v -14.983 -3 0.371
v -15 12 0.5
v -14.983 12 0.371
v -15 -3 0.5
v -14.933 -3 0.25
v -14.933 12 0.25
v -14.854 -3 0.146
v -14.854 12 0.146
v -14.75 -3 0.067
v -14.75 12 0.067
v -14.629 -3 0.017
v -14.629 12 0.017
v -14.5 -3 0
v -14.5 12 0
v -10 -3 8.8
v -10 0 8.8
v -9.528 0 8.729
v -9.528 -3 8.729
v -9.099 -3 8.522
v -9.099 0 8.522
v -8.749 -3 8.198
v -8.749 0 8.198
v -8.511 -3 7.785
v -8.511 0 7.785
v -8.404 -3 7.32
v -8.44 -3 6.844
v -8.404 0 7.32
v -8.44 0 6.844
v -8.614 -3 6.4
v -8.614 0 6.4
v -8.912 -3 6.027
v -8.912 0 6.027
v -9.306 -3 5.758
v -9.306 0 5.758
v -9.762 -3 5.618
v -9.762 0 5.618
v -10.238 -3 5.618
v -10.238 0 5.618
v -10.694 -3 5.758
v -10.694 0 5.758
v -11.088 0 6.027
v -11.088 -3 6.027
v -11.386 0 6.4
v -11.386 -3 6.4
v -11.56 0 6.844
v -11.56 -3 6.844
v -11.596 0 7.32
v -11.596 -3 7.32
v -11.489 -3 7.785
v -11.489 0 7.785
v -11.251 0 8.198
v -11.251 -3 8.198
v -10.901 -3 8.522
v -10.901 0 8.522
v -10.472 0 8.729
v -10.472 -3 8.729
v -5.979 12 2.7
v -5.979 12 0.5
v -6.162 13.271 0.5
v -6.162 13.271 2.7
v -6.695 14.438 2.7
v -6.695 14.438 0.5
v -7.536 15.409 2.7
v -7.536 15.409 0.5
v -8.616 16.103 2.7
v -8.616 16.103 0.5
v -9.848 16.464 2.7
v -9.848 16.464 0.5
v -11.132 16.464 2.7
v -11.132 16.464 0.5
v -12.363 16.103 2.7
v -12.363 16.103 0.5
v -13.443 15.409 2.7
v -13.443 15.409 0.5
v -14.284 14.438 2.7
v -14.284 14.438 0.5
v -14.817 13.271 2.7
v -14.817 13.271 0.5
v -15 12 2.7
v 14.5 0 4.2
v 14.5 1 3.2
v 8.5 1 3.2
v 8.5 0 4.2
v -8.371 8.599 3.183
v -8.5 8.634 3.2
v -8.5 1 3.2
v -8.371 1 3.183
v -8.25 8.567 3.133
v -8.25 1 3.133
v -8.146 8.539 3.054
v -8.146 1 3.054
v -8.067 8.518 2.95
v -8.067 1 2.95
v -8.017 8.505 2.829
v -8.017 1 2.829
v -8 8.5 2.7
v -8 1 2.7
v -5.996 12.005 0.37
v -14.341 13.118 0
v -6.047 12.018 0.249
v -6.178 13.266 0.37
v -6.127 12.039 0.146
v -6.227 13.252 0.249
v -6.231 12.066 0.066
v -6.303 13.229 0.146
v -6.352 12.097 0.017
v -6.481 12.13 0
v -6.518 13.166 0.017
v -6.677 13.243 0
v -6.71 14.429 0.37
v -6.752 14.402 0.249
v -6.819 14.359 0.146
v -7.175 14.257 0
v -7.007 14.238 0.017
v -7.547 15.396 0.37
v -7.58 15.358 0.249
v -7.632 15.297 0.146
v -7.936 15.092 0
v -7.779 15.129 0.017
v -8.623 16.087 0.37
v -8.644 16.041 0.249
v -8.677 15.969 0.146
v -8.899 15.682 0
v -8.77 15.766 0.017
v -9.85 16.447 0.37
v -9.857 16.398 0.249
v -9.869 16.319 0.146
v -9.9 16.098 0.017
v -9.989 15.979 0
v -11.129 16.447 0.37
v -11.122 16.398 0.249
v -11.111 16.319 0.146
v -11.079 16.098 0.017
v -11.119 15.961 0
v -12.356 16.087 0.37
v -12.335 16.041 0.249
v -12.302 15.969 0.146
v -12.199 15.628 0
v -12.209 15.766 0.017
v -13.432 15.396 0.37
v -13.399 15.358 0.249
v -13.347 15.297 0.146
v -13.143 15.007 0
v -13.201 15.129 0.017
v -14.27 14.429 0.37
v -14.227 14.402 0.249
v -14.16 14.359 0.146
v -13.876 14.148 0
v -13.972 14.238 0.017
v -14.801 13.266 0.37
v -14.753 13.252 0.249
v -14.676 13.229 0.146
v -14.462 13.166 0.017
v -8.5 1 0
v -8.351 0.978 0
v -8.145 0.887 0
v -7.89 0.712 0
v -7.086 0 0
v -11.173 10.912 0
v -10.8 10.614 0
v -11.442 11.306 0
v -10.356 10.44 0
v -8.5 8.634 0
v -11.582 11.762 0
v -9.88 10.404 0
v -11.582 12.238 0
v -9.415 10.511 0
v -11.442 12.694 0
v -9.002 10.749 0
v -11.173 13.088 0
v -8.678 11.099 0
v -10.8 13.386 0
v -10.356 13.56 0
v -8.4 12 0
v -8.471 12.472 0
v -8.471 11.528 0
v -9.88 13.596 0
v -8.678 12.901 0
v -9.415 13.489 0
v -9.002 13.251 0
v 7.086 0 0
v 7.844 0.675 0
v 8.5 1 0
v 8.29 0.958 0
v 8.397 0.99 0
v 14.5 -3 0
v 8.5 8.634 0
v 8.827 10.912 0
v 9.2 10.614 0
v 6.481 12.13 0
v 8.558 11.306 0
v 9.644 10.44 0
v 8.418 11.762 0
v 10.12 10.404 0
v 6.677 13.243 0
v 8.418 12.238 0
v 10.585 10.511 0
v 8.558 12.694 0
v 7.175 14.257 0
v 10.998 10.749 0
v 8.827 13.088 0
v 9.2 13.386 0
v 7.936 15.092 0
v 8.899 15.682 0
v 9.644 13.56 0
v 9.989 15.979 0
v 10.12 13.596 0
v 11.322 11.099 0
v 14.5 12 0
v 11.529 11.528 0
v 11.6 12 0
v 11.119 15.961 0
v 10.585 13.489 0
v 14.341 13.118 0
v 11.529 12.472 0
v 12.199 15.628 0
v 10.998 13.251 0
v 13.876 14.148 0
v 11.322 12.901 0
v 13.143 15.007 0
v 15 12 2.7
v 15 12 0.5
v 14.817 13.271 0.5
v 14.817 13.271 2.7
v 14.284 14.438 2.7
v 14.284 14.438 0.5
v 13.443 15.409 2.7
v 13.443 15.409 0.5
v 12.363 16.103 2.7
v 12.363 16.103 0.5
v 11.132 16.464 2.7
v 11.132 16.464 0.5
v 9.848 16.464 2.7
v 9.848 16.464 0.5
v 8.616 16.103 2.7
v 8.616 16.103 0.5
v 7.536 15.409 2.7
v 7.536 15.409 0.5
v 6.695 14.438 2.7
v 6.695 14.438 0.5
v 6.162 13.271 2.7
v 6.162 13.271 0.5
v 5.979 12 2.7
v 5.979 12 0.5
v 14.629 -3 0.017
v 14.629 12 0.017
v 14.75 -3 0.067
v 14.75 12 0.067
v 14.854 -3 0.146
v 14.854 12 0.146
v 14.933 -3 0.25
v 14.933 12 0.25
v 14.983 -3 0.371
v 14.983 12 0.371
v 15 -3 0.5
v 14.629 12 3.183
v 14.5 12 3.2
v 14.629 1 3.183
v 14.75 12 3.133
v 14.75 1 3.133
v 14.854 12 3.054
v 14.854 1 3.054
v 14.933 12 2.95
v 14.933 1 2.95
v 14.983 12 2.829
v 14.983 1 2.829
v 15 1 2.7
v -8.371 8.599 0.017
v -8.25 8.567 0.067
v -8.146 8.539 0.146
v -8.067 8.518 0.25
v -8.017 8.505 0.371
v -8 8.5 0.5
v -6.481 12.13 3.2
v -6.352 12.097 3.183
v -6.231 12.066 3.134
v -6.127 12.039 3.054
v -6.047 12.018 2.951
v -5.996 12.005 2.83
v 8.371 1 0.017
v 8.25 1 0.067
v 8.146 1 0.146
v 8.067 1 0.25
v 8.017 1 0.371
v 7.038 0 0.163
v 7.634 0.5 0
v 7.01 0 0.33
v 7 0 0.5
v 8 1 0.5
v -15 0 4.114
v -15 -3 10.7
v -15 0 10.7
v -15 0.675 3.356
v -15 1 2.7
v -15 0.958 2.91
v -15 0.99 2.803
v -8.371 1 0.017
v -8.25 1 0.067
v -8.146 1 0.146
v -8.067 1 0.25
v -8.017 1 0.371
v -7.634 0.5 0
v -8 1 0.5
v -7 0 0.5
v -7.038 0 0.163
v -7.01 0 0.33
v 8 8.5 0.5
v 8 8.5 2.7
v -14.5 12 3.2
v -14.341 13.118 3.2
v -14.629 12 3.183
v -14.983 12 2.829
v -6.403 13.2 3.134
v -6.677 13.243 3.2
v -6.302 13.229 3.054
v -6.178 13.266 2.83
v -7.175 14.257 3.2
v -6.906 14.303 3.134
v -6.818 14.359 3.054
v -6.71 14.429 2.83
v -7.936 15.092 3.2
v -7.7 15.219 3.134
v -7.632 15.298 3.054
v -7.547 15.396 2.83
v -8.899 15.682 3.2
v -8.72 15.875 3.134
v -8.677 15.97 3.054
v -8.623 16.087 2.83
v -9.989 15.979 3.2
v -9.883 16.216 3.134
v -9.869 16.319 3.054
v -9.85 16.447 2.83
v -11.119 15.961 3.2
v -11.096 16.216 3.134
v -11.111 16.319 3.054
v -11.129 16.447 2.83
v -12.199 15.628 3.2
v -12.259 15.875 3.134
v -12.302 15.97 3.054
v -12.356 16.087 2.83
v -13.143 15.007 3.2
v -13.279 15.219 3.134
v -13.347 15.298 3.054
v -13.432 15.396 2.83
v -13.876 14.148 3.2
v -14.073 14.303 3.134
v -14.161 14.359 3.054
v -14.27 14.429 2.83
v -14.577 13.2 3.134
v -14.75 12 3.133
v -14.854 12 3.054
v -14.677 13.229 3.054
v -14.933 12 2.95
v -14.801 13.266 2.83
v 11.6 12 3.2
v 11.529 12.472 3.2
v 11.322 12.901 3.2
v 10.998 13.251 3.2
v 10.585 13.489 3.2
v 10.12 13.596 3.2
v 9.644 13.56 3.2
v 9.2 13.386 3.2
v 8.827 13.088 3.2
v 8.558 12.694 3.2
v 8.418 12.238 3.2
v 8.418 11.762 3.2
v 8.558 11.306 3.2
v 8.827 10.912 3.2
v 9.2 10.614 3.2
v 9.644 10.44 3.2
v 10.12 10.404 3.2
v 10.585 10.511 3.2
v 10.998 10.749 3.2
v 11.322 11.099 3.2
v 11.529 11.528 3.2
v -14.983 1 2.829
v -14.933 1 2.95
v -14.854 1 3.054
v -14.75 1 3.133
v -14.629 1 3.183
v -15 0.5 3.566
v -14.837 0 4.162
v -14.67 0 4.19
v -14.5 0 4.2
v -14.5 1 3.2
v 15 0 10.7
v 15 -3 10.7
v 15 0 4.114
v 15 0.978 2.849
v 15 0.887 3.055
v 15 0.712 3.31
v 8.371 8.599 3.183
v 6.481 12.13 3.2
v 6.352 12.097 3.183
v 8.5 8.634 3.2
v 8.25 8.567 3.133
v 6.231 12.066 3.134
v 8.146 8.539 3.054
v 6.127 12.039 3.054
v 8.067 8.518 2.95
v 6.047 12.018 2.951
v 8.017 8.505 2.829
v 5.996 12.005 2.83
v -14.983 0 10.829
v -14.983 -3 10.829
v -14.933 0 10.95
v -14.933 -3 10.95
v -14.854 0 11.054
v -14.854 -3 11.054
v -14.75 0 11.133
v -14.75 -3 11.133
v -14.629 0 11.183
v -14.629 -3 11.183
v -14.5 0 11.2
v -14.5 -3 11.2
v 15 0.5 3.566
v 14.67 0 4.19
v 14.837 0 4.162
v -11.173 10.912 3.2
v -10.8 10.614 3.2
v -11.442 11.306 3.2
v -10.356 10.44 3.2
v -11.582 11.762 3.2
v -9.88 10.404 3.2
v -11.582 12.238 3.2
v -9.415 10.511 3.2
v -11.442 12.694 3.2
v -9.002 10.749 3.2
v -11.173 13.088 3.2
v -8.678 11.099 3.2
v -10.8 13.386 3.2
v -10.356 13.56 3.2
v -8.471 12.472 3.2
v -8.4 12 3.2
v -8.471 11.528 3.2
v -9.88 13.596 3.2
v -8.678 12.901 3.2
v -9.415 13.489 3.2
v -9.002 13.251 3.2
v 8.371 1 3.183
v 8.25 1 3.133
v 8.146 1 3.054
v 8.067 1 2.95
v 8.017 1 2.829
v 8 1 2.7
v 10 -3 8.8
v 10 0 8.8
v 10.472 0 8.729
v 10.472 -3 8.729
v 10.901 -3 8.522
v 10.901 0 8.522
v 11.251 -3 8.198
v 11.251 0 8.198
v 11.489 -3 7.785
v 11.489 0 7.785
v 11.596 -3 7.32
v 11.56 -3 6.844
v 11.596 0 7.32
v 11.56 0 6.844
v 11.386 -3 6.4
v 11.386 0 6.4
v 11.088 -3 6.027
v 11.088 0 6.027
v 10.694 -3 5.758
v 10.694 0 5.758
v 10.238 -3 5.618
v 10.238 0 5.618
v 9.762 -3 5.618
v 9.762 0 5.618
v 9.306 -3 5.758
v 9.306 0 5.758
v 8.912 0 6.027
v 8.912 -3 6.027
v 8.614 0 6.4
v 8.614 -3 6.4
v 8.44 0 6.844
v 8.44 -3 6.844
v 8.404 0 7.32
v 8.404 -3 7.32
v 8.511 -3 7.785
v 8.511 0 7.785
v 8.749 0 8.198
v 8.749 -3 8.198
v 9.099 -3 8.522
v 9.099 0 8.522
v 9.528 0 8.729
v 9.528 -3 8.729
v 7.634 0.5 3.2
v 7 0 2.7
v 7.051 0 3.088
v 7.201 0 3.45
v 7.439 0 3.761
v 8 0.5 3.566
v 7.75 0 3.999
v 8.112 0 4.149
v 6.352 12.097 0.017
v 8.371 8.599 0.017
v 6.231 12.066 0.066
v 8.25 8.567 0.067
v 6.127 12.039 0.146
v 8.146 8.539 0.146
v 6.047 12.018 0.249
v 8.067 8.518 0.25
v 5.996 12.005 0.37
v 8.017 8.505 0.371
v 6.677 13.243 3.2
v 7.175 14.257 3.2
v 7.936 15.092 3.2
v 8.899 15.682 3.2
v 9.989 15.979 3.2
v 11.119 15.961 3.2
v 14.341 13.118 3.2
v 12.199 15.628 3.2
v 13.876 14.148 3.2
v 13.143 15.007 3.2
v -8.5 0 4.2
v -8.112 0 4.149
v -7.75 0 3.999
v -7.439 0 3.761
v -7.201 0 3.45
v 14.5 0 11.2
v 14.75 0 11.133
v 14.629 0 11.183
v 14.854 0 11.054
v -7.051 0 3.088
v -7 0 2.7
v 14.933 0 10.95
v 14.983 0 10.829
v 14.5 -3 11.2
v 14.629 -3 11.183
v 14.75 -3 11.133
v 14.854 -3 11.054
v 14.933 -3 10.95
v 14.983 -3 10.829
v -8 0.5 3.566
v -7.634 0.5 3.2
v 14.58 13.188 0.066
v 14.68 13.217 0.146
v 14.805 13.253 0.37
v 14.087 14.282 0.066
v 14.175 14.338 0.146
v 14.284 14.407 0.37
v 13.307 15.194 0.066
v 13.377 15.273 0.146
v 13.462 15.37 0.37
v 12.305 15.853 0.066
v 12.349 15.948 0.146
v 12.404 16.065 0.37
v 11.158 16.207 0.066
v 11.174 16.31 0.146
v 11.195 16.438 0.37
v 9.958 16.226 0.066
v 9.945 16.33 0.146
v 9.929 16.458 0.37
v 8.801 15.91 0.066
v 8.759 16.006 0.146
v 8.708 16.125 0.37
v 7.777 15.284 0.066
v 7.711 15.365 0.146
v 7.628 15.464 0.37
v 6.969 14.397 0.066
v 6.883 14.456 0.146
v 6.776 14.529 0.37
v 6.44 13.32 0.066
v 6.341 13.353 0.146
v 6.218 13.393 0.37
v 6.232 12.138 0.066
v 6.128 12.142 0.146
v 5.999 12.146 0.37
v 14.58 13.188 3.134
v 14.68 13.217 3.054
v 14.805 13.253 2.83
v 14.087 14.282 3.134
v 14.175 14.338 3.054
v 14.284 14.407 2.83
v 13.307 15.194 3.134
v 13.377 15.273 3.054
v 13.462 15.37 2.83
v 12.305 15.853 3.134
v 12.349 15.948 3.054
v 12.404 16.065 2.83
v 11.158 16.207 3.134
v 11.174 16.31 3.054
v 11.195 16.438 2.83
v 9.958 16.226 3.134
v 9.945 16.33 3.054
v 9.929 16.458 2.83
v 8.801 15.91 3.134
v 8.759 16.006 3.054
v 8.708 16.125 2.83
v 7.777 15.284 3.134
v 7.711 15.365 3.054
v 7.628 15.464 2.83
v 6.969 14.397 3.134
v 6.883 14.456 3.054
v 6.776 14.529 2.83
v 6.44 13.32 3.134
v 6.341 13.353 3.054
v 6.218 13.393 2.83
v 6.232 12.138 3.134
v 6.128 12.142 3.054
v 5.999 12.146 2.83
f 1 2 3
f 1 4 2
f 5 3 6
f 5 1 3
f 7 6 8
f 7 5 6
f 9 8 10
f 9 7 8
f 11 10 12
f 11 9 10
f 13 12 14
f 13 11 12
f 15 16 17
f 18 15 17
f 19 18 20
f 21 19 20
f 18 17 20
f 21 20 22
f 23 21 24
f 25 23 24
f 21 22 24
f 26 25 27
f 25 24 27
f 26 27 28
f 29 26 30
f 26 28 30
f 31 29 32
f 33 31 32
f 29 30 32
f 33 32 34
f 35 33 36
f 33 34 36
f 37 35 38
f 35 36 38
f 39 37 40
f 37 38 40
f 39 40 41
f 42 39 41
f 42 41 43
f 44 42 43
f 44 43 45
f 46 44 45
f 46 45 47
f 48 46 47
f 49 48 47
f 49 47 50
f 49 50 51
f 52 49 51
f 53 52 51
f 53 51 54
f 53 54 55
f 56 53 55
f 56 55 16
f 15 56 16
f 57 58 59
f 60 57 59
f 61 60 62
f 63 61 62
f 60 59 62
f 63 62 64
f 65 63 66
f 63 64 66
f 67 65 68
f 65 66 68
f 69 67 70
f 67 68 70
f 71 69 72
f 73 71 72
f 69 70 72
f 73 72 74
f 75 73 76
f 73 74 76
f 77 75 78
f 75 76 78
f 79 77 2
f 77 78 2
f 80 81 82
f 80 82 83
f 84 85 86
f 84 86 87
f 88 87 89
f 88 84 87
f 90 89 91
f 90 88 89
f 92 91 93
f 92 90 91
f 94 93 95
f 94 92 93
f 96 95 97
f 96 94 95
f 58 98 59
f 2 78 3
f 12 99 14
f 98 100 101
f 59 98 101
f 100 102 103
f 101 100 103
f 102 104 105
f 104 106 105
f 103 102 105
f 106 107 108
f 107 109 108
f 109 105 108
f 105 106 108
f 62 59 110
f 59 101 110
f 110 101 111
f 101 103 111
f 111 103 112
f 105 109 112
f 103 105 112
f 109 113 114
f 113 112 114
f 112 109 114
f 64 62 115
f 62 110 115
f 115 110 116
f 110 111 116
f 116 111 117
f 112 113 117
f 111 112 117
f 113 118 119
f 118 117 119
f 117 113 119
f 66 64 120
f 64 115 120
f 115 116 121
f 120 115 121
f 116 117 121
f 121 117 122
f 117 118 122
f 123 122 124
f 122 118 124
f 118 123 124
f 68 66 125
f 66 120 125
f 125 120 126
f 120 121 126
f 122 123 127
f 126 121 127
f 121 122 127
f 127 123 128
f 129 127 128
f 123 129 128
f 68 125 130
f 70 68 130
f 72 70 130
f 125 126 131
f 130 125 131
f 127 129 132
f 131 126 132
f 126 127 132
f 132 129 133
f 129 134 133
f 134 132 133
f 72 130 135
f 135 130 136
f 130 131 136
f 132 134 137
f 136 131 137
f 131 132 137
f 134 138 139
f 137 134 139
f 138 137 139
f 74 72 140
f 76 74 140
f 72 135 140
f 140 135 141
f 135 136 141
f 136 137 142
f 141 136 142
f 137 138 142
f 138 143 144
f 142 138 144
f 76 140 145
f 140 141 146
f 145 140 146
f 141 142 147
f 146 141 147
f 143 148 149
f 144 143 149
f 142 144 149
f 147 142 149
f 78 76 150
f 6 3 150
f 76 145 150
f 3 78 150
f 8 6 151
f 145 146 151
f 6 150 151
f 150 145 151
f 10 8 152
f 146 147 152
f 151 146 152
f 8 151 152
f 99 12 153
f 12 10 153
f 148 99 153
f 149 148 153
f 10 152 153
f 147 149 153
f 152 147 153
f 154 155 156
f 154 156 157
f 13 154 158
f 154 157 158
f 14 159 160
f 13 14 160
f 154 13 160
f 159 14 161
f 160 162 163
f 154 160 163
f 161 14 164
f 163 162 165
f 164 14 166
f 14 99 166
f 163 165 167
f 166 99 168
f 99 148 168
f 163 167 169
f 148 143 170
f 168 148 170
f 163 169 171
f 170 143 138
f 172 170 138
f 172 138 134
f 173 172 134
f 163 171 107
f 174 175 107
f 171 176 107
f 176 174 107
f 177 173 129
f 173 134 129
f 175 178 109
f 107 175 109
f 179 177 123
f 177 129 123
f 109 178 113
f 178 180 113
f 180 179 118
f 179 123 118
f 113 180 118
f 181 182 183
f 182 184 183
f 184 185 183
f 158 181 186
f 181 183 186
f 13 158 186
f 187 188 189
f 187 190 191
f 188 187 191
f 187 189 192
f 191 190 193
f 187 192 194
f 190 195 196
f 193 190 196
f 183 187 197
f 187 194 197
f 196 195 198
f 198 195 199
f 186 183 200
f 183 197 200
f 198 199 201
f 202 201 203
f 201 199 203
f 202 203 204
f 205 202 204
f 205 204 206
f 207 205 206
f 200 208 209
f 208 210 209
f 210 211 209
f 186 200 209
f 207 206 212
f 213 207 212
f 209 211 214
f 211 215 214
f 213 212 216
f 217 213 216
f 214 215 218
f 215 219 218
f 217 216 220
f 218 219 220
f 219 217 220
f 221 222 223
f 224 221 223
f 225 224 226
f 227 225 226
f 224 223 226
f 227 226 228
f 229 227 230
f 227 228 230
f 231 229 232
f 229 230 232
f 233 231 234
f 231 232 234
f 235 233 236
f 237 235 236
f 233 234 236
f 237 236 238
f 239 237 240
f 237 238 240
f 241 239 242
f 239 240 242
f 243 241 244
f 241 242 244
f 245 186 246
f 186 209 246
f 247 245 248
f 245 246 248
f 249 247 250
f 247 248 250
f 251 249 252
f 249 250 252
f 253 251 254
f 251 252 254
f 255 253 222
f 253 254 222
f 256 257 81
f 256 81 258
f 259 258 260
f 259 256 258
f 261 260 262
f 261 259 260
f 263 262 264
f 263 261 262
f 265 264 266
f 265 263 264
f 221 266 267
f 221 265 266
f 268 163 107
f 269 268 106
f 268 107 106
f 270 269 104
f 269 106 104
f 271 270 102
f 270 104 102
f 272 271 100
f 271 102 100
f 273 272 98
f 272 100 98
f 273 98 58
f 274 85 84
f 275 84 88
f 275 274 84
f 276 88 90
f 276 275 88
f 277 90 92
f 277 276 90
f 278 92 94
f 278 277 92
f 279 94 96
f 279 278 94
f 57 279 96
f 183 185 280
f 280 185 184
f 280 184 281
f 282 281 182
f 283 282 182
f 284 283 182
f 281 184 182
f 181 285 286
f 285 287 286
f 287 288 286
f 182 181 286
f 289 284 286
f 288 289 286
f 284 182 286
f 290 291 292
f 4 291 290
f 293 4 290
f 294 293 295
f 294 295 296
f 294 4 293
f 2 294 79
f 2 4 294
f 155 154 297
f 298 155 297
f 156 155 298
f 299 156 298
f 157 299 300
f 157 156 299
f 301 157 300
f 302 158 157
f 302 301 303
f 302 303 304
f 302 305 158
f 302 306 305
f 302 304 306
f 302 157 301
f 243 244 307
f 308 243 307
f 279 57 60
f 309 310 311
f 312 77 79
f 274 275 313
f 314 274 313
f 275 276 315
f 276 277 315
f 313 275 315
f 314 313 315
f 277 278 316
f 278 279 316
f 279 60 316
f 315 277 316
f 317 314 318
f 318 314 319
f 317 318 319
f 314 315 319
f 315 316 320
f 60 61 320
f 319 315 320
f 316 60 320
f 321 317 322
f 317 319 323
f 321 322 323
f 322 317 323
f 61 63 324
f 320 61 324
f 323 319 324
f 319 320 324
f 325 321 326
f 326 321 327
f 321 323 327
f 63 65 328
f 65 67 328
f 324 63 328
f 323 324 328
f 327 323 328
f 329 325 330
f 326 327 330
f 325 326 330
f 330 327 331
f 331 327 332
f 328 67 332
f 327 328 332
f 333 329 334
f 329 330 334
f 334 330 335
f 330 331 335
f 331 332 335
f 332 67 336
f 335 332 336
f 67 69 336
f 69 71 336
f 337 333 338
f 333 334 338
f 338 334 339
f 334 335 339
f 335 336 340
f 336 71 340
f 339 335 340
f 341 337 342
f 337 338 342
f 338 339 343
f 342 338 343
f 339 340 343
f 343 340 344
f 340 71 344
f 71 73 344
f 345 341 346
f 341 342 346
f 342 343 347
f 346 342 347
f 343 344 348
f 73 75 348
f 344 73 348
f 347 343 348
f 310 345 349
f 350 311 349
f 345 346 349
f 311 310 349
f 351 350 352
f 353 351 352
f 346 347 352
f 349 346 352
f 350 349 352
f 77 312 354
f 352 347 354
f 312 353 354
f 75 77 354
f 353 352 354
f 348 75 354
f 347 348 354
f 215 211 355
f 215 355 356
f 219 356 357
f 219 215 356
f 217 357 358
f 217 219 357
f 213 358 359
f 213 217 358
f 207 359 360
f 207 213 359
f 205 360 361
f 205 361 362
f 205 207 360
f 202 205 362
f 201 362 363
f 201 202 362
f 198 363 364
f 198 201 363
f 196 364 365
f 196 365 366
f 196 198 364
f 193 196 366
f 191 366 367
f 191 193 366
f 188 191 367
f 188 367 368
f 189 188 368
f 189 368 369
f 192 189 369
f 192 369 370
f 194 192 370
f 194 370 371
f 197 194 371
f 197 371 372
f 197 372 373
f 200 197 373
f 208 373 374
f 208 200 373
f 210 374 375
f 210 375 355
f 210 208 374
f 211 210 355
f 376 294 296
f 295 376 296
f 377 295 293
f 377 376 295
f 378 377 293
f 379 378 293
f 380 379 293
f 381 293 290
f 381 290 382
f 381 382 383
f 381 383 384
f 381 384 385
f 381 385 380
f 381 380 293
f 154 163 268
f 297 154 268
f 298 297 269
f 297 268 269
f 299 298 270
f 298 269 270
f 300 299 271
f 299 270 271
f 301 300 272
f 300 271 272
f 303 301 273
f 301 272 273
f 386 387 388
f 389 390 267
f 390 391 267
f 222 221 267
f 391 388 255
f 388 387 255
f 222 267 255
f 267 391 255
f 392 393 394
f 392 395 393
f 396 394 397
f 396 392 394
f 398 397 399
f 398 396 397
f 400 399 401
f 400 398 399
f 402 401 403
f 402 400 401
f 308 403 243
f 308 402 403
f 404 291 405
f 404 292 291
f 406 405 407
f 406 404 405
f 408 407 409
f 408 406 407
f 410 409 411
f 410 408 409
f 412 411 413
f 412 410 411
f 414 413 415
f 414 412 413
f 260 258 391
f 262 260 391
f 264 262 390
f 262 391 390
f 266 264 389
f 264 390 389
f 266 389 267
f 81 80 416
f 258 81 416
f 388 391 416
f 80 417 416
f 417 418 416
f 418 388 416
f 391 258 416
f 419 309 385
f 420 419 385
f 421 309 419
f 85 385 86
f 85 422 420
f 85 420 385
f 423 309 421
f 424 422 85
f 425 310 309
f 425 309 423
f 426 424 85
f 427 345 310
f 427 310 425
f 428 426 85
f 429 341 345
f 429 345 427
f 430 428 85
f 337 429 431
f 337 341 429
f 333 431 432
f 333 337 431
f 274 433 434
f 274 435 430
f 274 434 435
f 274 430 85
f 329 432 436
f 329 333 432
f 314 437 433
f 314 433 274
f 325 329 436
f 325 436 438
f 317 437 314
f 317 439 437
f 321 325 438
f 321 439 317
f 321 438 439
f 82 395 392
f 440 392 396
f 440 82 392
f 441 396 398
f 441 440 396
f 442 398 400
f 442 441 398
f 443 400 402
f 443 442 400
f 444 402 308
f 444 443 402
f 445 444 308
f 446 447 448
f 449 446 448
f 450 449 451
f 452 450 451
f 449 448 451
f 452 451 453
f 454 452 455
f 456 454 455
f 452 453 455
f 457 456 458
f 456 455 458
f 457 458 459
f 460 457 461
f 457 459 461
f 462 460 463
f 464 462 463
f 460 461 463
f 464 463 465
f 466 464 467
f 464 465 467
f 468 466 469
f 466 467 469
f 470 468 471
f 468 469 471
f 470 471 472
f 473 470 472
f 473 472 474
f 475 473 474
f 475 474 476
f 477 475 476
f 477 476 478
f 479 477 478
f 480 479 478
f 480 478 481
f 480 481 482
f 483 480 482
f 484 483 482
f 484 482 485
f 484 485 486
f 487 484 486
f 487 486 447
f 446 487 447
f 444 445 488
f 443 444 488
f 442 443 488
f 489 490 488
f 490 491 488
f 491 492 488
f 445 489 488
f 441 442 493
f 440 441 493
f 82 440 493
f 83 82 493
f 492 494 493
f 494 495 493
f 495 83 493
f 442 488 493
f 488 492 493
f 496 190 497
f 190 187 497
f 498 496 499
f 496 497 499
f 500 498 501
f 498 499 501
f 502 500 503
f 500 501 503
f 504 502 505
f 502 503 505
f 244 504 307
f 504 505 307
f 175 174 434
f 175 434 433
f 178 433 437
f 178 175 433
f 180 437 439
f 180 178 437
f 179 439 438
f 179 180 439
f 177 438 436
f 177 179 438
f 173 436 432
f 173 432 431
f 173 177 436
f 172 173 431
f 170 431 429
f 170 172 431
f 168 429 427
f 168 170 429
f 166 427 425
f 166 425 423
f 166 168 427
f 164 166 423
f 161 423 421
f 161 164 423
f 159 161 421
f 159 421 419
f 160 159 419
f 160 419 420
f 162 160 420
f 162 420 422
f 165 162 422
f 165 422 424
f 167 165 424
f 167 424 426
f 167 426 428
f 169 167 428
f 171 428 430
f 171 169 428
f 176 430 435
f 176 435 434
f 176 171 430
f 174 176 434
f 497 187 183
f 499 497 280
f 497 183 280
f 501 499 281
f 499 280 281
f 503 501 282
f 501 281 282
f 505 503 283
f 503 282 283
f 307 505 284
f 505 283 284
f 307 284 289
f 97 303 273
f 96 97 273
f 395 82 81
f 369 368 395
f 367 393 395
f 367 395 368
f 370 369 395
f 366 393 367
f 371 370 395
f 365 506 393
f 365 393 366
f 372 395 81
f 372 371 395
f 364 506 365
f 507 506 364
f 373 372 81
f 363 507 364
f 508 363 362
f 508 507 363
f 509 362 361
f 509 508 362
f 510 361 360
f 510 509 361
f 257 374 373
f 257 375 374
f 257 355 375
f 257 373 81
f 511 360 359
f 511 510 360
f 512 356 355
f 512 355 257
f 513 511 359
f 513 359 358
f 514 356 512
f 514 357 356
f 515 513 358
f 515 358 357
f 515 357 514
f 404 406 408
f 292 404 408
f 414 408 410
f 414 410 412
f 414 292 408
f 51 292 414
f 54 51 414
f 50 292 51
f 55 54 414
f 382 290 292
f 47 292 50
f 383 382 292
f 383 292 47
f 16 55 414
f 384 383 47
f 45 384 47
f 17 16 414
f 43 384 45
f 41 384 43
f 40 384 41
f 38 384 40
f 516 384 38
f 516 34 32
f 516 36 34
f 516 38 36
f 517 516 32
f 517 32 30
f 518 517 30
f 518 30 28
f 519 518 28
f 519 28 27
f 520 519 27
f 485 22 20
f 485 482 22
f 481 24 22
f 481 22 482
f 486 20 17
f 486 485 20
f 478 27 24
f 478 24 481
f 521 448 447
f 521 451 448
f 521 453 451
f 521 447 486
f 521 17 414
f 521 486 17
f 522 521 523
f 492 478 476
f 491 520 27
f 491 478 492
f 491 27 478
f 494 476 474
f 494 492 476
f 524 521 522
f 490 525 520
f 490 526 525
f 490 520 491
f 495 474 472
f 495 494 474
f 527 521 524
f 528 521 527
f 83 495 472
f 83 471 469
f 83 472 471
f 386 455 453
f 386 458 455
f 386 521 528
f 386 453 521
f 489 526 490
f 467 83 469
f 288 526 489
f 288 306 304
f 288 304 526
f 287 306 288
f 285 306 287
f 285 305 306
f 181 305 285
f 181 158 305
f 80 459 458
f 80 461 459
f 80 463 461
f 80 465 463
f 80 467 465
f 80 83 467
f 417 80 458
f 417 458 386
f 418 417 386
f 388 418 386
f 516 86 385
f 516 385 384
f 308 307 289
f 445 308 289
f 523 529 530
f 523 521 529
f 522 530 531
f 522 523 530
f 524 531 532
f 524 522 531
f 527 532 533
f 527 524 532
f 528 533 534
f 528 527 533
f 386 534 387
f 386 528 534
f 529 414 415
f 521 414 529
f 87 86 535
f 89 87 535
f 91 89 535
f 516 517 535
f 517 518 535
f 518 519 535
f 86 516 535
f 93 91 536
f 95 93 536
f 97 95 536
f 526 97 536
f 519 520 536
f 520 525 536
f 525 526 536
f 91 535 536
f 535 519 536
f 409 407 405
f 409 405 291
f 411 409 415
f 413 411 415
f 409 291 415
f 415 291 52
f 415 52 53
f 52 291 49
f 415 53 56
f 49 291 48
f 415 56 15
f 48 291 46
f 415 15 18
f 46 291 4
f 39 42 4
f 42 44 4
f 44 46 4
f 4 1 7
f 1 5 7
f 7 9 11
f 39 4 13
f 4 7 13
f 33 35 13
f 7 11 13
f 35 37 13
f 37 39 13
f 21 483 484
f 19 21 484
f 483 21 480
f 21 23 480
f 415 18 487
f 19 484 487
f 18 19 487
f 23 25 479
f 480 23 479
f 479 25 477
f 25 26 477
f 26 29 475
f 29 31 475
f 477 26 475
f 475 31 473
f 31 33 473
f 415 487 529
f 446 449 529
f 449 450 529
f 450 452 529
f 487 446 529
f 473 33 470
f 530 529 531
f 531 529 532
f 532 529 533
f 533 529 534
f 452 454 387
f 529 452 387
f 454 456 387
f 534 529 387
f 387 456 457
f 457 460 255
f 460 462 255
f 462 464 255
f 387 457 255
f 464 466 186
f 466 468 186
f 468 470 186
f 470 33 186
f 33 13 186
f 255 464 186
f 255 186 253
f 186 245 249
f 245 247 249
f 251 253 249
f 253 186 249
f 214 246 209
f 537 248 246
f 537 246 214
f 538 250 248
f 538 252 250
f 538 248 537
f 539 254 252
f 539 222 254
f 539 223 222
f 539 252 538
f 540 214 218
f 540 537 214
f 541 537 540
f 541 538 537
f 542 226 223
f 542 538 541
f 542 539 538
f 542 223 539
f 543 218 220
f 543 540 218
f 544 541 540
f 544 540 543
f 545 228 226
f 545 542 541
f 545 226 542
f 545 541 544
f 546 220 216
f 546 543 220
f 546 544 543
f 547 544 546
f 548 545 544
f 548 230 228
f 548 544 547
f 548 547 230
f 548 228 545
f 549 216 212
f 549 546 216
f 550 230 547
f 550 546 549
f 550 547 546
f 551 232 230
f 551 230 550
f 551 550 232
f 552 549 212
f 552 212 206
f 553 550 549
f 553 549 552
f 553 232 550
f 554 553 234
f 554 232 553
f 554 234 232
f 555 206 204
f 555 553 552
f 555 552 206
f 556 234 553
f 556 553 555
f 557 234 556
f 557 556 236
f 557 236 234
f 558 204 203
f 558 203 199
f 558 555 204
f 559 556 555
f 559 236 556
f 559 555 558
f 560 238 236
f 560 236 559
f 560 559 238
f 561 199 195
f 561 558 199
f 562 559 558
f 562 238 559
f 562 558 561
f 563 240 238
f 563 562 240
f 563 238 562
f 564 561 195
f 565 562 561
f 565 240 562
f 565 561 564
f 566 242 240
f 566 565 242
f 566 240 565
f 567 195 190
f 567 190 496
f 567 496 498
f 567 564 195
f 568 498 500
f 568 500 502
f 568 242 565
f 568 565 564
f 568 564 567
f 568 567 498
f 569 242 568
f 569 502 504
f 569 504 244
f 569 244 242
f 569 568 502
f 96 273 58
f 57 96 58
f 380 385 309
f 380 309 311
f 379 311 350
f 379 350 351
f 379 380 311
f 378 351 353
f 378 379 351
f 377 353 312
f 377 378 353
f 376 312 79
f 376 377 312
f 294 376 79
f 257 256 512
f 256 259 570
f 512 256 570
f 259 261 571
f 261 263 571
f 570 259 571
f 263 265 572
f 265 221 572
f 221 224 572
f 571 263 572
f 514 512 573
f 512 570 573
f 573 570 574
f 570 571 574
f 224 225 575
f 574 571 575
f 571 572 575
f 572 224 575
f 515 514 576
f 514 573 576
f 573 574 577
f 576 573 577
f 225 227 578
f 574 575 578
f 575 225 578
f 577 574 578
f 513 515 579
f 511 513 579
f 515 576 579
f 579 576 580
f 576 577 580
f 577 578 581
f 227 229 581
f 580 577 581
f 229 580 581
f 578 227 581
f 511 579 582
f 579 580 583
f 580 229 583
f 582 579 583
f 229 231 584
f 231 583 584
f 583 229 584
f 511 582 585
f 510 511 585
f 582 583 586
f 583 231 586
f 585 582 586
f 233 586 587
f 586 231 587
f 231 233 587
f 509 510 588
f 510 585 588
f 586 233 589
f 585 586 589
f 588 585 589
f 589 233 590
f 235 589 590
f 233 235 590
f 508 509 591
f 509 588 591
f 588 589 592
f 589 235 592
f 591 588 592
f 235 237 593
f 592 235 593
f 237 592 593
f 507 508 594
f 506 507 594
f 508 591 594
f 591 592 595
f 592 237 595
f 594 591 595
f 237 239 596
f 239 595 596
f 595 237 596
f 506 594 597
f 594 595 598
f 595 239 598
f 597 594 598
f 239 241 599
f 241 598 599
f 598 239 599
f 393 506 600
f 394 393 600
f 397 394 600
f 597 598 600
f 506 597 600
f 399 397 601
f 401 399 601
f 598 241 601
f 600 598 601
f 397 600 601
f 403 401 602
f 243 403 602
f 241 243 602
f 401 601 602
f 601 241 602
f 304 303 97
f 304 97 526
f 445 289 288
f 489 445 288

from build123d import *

# Parameters (mm, degrees)
SKETCH1_R           = 1.6
BOSS_EXTRUDE1_DEPTH = 3.2
SKETCH2_W           = 30
SKETCH2_H           = 3
BOSS_EXTRUDE2_DEPTH = 8
SKETCH3_R           = 1.6
CUT_EXTRUDE1_DEPTH  = 25.960610678
FILLET1_R           = 0.5
CHAMFER1_SIZE       = 1


with BuildPart() as part:
    # Sketch1 → Boss-Extrude1 (new body)
    with BuildSketch(Plane.XY):
        with BuildLine():
            Line((-15, -3), (15, -3))
            Line((15, -3), (15, 12))
            ThreePointArc((15, 12), (10.489637029, 16.510362971), (5.979274058, 12))
            Line((5.979274058, 12), (8, 8.5))
            Line((8, 8.5), (8, 0))
            Line((8, 0), (-8, 0))
            Line((-8, 0), (-8, 8.5))
            Line((-8, 8.5), (-5.979274058, 12))
            ThreePointArc((-5.979274058, 12), (-10.489637029, 16.510362971), (-15, 12))
            Line((-15, 12), (-15, -3))
        make_face()
        with Locations((-10, 12)):
            Circle(SKETCH1_R, mode=Mode.SUBTRACT)
        with Locations((10, 12)):
            Circle(SKETCH1_R, mode=Mode.SUBTRACT)
    extrude(amount=BOSS_EXTRUDE1_DEPTH)

    # Sketch2 → Boss-Extrude2 (add)
    with BuildSketch(Plane.XY.offset(3.2)):
        with Locations((0, -1.5)):
            Rectangle(SKETCH2_W, SKETCH2_H)
    extrude(amount=BOSS_EXTRUDE2_DEPTH)

    # Sketch3 → Cut-Extrude1 (cut, through all)
    with BuildSketch(Plane(origin=(0, 0, 0), x_dir=(1, 0, 0), z_dir=(0, 1, 0))):
        with Locations(Location((-10, -7.2, 0), (0, 0, 270))):
            Circle(SKETCH3_R)
        with Locations(Location((10, -7.2, 0), (0, 0, 270))):
            Circle(SKETCH3_R)
    extrude(amount=-CUT_EXTRUDE1_DEPTH, mode=Mode.SUBTRACT)

    # Fillet1
    fillet1_edges = [part.edges().sort_by_distance(p)[0] for p in [
        (8, 4.25, 0),
        (6.989637029, 10.25, 0),
        (10.489637029, 16.510362971, 0),
        (15, 4.5, 0),
        (-15, 4.5, 0),
        (-10.489637029, 16.510362971, 0),
        (10.489637029, 16.510362971, 3.2),
        (6.989637029, 10.25, 3.2),
        (8, 4.25, 3.2),
        (-8, 4.25, 3.2),
        (-6.989637029, 10.25, 3.2),
        (15, 6, 3.2),
        (-10.489637029, 16.510362971, 3.2),
        (-15, -1.5, 11.2),
        (15, -1.5, 11.2),
        (-15, 6, 3.2),
        (-6.989637029, 10.25, 0),
        (-8, 4.25, 0),
    ]]
    fillet(fillet1_edges, radius=FILLET1_R)

    # Chamfer1
    # the kernel refuses this chamfer: 1 mm, written as the material it adds along each edge
    with BuildSketch(Plane(origin=(-8.5, 0, 3.2), x_dir=(0, 0.9996219169112968, -0.027495876610586494), z_dir=(-1, 0, 0)), Plane(origin=(14.5, 0, 3.2), x_dir=(0, 0.9996219169112968, -0.027495876610586494), z_dir=(-1, 0, 0))) as chamfer1_piece_1:
        Polygon((CHAMFER1_SIZE * 0.999621916911, -CHAMFER1_SIZE * 0.0274958766106), (-CHAMFER1_SIZE * 0.0274958766106, -CHAMFER1_SIZE * 0.999621916911), (0, 0), align=None)
    extrude(amount=6)
    with BuildSketch(Plane(origin=(-8, 0, 0.5), x_dir=(-0.02749587661058563, 0.9996219169112968, 0), z_dir=(0, 0, 1))) as chamfer1_piece_2:
        Polygon((CHAMFER1_SIZE * 0.999621916911, -CHAMFER1_SIZE * 0.0274958766106), (-CHAMFER1_SIZE * 0.0274958766106, -CHAMFER1_SIZE * 0.999621916911), (0, 0), align=None)
    extrude(amount=2.2)
    with BuildSketch(Plane(origin=(8, 0, 0.5), x_dir=(0.027495876610585633, 0.9996219169112968, 0), z_dir=(0, 0, 1))) as chamfer1_piece_3:
        Polygon((CHAMFER1_SIZE * 0.999621916911, CHAMFER1_SIZE * 0.0274958766106), (-CHAMFER1_SIZE * 0.0274958766106, CHAMFER1_SIZE * 0.999621916911), (0, 0), align=None)
    extrude(amount=2.2)
    with BuildSketch(Plane(origin=(-14.5, 0, 2.7), x_dir=(0.006283143965557512, 0, 0.9999802608561372), z_dir=(-0.9999802608561372, 0, 0.006283143965557512))) as chamfer1_piece_4_section:
        Polygon((-0.5 - CHAMFER1_SIZE, 0), (-0.5, CHAMFER1_SIZE), (-0.5, 0), align=None)
    chamfer1_piece_4 = revolve(axis=Axis((-14.5, 0, 2.7), (0, 1, 0)), revolution_arc=359.64, mode=Mode.PRIVATE)
    chamfer1_piece_4 = split(chamfer1_piece_4, bisect_by=Plane(origin=(-15, 0.469782675, 3.086220861), z_dir=(1, 0, 0)), keep=Keep.TOP, mode=Mode.PRIVATE)
    add(chamfer1_piece_4)
    with BuildSketch(Plane(origin=(-8.5, 0, 0.5), x_dir=(0.9999802608561372, 0, 0.006283143965558622), z_dir=(0.006283143965558622, 0, -0.9999802608561372))) as chamfer1_piece_5_section:
        Polygon((-0.5, -CHAMFER1_SIZE), (-0.5 - CHAMFER1_SIZE, 0), (-0.5, 0), align=None)
    chamfer1_piece_5 = revolve(axis=Axis((-8.5, 0, 0.5), (0, -1, 0)), revolution_arc=359.64, mode=Mode.PRIVATE)
    chamfer1_piece_5 = split(chamfer1_piece_5, bisect_by=Plane(origin=(-8.113779143, 0.469782674, 0), z_dir=(0, 0, 1)), keep=Keep.TOP, mode=Mode.PRIVATE)
    add(chamfer1_piece_5)
    with BuildSketch(Plane(origin=(8.5, 0, 2.7), x_dir=(-1, 0, 0), z_dir=(0, 0, -1))) as chamfer1_piece_6:
        Polygon((0.5, CHAMFER1_SIZE), (0.5 + CHAMFER1_SIZE, 0), (0.5, 0), align=None)
    revolve(axis=Axis((8.5, 0, 2.7), (0, 1, 0)), revolution_arc=90)
    with BuildSketch(Plane(origin=(8.5, 0, 0.5), x_dir=(-0.9999802608561372, 0, 0.006283143965558622), z_dir=(-0.006283143965558622, 0, -0.9999802608561372))) as chamfer1_piece_7_section:
        Polygon((-0.5, CHAMFER1_SIZE), (-0.5 - CHAMFER1_SIZE, 0), (-0.5, 0), align=None)
    chamfer1_piece_7 = revolve(axis=Axis((8.5, 0, 0.5), (0, 1, 0)), revolution_arc=359.64, mode=Mode.PRIVATE)
    chamfer1_piece_7 = split(chamfer1_piece_7, bisect_by=Plane(origin=(8.113779139, 0.469782675, 0), z_dir=(0, 0, 1)), keep=Keep.TOP, mode=Mode.PRIVATE)
    add(chamfer1_piece_7)
    with BuildSketch(Plane(origin=(14.5, 0, 2.7), x_dir=(0, 0, 1), z_dir=(-1, 0, 0))) as chamfer1_piece_8_section:
        Polygon((0.5, CHAMFER1_SIZE), (0.5 + CHAMFER1_SIZE, 0), (0.5, 0), align=None)
    chamfer1_piece_8 = revolve(axis=Axis((14.5, 0, 2.7), (0, 1, 0)), revolution_arc=359.64, mode=Mode.PRIVATE)
    chamfer1_piece_8 = split(chamfer1_piece_8, bisect_by=Plane(origin=(15, 0.469782675, 3.086220861), z_dir=(-1, 0, 0)), keep=Keep.TOP, mode=Mode.PRIVATE)
    add(chamfer1_piece_8)
    with BuildSketch(Plane(origin=(-8.5, 0, 2.7), x_dir=(0, 0, 1), z_dir=(-1, 0, 0))) as chamfer1_piece_9:
        Polygon((0.5, CHAMFER1_SIZE), (0.5 + CHAMFER1_SIZE, 0), (0.5, 0), align=None)
    revolve(axis=Axis((-8.5, 0, 2.7), (0, 1, 0)), revolution_arc=90)


solid = part.part
